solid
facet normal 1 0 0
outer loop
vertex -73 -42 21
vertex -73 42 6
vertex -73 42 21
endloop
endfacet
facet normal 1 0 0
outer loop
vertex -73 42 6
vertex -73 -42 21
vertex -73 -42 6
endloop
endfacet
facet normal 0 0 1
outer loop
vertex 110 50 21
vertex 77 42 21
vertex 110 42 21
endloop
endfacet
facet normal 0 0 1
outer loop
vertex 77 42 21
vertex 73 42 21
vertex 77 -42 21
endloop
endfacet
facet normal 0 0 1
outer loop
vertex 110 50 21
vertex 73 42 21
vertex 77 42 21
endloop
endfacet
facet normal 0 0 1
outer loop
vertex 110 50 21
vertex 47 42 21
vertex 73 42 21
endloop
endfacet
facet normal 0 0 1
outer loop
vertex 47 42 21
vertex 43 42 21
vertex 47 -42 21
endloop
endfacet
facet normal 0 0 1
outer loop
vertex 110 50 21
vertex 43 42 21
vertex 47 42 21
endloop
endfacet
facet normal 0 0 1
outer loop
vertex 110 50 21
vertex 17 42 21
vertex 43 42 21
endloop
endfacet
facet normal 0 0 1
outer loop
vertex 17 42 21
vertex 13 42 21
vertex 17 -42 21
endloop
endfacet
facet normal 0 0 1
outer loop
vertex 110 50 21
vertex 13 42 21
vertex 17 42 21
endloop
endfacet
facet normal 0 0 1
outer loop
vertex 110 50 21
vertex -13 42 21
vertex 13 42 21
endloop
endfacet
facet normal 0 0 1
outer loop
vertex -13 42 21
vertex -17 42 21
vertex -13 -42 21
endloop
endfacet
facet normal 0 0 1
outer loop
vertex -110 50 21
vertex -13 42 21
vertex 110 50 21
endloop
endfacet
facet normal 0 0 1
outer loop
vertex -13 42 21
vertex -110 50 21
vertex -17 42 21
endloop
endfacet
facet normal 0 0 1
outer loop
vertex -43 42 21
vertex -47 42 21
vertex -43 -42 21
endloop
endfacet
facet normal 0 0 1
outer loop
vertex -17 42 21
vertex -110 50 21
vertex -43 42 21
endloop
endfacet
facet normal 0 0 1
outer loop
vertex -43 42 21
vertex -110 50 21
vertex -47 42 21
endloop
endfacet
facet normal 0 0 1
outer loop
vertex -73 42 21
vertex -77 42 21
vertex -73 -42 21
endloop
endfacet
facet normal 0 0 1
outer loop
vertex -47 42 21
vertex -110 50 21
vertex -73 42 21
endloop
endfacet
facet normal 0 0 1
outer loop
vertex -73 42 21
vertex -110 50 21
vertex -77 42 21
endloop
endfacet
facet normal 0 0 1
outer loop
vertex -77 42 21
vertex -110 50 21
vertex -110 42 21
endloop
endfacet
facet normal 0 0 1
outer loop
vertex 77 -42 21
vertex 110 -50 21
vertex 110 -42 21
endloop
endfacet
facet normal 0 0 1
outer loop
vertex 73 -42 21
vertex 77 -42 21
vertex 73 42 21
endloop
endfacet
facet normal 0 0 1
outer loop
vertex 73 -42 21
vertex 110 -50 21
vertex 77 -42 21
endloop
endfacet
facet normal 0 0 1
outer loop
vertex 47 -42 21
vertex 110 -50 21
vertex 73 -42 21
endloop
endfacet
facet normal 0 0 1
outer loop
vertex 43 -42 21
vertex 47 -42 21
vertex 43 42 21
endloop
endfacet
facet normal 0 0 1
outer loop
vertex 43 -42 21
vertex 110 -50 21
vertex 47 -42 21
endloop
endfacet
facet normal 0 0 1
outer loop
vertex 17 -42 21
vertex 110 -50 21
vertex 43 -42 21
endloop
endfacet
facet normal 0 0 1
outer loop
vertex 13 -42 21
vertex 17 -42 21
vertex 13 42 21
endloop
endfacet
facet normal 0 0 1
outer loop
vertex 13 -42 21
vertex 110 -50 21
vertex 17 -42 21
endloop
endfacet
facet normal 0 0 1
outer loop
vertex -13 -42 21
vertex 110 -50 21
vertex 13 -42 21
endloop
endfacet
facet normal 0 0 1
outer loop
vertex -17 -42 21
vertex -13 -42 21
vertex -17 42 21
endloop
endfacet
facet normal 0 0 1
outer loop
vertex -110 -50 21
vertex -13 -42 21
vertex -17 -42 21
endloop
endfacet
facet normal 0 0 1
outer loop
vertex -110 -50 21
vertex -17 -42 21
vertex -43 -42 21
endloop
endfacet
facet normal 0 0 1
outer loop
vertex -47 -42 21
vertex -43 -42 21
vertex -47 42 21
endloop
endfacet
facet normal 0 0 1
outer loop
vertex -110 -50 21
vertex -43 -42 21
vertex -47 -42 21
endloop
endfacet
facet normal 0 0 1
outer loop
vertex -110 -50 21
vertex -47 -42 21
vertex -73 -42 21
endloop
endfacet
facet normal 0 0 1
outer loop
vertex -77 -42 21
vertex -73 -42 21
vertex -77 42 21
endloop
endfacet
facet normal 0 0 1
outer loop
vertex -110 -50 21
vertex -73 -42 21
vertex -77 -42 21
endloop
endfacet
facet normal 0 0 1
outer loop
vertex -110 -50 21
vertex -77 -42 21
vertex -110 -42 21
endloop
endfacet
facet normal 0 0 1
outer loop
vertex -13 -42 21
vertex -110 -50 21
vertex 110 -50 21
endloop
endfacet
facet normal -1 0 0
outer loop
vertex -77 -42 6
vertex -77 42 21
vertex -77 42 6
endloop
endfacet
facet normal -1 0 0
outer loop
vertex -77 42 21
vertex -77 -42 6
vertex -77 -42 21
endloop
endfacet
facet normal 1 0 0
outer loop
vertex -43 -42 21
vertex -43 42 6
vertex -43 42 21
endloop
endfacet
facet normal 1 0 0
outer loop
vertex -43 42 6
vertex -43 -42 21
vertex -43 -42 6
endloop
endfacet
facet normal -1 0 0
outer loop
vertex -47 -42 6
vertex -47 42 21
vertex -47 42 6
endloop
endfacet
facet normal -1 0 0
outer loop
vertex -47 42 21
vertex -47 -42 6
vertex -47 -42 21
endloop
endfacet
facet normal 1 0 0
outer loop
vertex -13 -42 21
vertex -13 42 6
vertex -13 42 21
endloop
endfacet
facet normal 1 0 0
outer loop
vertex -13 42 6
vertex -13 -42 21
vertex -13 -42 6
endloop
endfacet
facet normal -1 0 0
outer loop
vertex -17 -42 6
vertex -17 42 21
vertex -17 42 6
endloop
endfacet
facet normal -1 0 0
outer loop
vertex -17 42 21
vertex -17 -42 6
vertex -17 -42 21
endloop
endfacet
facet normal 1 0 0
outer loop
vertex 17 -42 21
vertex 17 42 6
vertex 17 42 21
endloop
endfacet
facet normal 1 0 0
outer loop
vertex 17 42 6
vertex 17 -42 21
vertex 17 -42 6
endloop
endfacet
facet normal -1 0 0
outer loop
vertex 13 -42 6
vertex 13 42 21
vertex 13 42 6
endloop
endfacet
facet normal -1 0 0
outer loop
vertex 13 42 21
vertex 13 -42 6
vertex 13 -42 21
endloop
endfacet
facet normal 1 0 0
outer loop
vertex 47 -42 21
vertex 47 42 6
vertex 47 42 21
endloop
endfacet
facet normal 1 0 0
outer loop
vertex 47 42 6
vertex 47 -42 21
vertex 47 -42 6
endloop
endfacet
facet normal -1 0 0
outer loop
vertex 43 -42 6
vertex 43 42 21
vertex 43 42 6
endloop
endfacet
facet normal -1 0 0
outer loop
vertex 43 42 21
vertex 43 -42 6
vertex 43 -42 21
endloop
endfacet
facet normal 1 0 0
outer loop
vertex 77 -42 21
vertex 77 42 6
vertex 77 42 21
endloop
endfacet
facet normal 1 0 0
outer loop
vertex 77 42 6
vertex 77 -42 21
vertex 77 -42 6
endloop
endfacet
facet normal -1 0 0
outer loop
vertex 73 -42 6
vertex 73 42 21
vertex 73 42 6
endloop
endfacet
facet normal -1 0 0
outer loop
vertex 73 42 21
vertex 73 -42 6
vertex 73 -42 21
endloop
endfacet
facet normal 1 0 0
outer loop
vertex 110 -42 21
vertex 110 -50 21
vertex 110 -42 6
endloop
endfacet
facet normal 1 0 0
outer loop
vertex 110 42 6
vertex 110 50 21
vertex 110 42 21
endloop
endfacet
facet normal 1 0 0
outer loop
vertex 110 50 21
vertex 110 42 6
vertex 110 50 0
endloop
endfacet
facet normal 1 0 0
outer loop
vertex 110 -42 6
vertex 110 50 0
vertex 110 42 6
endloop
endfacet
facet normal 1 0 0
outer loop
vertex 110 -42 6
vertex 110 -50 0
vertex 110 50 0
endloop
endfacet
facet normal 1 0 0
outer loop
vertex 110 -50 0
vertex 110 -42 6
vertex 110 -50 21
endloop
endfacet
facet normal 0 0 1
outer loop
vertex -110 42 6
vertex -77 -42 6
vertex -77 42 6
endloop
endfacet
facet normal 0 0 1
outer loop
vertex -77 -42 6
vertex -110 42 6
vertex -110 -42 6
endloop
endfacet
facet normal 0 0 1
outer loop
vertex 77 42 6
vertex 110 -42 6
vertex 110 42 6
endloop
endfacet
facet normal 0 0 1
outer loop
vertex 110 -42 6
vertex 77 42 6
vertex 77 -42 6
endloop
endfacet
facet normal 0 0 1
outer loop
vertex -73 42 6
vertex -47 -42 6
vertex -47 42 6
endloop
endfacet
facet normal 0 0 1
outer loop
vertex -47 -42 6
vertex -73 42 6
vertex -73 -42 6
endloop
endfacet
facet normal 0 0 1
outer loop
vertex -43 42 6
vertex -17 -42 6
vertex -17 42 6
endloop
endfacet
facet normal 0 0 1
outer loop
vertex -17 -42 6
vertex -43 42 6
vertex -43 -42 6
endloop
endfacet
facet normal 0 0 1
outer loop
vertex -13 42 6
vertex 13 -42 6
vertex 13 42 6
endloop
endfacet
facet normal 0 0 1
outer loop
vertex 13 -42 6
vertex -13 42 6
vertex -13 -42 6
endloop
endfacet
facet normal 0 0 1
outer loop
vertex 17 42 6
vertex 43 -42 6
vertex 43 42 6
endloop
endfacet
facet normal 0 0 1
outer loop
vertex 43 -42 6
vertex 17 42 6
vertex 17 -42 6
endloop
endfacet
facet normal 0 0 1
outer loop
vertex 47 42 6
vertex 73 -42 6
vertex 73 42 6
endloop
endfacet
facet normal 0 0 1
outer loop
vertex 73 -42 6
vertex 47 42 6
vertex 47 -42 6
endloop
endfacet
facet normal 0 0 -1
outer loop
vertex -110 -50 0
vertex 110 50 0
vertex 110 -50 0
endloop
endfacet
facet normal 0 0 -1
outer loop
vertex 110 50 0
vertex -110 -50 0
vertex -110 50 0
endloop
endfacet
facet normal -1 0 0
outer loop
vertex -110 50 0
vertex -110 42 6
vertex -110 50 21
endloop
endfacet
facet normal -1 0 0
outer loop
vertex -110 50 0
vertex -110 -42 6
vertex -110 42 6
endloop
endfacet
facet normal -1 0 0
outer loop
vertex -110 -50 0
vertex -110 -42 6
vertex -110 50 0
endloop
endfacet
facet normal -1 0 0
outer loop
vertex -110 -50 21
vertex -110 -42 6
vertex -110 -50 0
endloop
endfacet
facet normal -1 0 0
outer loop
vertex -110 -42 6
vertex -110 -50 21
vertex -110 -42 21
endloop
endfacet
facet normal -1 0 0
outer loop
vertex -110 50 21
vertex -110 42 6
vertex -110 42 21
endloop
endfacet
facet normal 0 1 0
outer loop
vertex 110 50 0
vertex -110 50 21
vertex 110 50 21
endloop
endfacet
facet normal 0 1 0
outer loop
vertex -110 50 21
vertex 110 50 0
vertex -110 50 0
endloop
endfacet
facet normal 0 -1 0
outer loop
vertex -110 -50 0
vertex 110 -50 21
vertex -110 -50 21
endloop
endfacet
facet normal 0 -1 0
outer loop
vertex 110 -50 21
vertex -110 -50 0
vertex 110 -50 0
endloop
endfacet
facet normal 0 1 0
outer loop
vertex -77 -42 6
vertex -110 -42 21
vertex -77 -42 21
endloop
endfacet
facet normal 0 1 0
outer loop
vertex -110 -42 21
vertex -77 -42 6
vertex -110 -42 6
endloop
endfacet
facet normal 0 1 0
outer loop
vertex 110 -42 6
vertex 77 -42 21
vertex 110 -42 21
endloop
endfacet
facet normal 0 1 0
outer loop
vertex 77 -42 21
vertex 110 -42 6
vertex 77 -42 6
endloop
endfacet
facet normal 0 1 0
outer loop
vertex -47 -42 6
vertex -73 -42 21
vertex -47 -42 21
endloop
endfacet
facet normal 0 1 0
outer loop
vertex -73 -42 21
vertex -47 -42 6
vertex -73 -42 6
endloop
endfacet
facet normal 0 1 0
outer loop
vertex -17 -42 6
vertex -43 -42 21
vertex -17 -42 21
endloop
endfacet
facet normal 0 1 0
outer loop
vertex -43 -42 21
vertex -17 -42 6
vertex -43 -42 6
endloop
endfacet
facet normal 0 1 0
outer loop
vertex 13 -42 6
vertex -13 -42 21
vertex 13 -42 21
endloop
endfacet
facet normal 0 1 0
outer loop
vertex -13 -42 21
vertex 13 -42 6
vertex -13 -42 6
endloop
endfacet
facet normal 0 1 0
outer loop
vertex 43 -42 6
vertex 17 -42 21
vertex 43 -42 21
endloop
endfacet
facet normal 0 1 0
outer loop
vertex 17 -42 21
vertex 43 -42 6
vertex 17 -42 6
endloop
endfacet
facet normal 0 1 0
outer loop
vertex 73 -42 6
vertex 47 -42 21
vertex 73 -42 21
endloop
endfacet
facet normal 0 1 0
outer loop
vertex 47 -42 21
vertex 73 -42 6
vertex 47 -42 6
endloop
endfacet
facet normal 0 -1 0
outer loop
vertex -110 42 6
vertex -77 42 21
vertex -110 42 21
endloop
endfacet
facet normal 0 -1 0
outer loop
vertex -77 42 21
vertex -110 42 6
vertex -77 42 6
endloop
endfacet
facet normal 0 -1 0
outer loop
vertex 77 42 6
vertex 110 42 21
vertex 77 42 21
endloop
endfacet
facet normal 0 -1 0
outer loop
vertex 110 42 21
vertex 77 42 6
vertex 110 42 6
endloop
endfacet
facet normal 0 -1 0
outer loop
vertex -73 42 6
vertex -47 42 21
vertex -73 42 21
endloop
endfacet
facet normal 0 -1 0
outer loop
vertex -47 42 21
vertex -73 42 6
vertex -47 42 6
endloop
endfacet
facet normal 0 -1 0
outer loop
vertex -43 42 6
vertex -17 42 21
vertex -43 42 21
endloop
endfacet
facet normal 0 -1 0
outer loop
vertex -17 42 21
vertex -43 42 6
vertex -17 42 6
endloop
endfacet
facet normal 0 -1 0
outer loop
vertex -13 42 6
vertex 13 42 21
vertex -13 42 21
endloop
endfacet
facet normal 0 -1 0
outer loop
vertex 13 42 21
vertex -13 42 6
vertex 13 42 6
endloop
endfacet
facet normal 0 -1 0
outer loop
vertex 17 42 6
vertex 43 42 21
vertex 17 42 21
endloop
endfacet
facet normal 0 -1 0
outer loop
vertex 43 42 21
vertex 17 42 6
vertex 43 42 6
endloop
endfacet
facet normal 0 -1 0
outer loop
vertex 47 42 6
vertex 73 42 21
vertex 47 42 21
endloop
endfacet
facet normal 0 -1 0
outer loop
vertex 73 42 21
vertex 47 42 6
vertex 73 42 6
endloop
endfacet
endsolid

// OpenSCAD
$fn = 32;

// ----------------------------------------------------------------------
// Rib frame 220 x 100 x 21
// 6 ribs at 30 mm pitch
// ----------------------------------------------------------------------

// --- parameters (mm) ---
frame = [220, 100, 6];  // base plate size (x, y, z)
rail_w = 8;             // side rail width
ribs = 6;               // number of ribs
rib_t = 4;              // rib thickness
rib_h = 15;             // rib height above the base plate
pitch = 30;             // pitch between rib centres

// --- derived feature positions (mm) ---
span = (ribs - 1) * pitch;          // = 150   distance between the outer ribs
origin_x = -span / 2;               // = -75   X of the first rib
rib_len = frame[1] - 2 * rail_w + 2;  // = 86   rib length, 1 mm into each rail
feature_centers = [
  [origin_x + 0 * pitch, 0],
  [origin_x + 1 * pitch, 0],
  [origin_x + 2 * pitch, 0],
  [origin_x + 3 * pitch, 0],
  [origin_x + 4 * pitch, 0],
  [origin_x + 5 * pitch, 0]
];   // rib centre line, drives the rib loop

// base plate, two side rails, then the ribs read straight off feature_centers
union() {
  translate([-frame[0] / 2, -frame[1] / 2, 0]) cube(frame);
  translate([-frame[0] / 2, -frame[1] / 2, 0]) cube([frame[0], rail_w, frame[2] + rib_h]);
  translate([-frame[0] / 2, frame[1] / 2 - rail_w, 0]) cube([frame[0], rail_w, frame[2] + rib_h]);
  for (centre = feature_centers)
    translate([centre[0] - rib_t / 2, centre[1] - rib_len / 2, frame[2] - 1])
      cube([rib_t, rib_len, rib_h + 1]);
}
